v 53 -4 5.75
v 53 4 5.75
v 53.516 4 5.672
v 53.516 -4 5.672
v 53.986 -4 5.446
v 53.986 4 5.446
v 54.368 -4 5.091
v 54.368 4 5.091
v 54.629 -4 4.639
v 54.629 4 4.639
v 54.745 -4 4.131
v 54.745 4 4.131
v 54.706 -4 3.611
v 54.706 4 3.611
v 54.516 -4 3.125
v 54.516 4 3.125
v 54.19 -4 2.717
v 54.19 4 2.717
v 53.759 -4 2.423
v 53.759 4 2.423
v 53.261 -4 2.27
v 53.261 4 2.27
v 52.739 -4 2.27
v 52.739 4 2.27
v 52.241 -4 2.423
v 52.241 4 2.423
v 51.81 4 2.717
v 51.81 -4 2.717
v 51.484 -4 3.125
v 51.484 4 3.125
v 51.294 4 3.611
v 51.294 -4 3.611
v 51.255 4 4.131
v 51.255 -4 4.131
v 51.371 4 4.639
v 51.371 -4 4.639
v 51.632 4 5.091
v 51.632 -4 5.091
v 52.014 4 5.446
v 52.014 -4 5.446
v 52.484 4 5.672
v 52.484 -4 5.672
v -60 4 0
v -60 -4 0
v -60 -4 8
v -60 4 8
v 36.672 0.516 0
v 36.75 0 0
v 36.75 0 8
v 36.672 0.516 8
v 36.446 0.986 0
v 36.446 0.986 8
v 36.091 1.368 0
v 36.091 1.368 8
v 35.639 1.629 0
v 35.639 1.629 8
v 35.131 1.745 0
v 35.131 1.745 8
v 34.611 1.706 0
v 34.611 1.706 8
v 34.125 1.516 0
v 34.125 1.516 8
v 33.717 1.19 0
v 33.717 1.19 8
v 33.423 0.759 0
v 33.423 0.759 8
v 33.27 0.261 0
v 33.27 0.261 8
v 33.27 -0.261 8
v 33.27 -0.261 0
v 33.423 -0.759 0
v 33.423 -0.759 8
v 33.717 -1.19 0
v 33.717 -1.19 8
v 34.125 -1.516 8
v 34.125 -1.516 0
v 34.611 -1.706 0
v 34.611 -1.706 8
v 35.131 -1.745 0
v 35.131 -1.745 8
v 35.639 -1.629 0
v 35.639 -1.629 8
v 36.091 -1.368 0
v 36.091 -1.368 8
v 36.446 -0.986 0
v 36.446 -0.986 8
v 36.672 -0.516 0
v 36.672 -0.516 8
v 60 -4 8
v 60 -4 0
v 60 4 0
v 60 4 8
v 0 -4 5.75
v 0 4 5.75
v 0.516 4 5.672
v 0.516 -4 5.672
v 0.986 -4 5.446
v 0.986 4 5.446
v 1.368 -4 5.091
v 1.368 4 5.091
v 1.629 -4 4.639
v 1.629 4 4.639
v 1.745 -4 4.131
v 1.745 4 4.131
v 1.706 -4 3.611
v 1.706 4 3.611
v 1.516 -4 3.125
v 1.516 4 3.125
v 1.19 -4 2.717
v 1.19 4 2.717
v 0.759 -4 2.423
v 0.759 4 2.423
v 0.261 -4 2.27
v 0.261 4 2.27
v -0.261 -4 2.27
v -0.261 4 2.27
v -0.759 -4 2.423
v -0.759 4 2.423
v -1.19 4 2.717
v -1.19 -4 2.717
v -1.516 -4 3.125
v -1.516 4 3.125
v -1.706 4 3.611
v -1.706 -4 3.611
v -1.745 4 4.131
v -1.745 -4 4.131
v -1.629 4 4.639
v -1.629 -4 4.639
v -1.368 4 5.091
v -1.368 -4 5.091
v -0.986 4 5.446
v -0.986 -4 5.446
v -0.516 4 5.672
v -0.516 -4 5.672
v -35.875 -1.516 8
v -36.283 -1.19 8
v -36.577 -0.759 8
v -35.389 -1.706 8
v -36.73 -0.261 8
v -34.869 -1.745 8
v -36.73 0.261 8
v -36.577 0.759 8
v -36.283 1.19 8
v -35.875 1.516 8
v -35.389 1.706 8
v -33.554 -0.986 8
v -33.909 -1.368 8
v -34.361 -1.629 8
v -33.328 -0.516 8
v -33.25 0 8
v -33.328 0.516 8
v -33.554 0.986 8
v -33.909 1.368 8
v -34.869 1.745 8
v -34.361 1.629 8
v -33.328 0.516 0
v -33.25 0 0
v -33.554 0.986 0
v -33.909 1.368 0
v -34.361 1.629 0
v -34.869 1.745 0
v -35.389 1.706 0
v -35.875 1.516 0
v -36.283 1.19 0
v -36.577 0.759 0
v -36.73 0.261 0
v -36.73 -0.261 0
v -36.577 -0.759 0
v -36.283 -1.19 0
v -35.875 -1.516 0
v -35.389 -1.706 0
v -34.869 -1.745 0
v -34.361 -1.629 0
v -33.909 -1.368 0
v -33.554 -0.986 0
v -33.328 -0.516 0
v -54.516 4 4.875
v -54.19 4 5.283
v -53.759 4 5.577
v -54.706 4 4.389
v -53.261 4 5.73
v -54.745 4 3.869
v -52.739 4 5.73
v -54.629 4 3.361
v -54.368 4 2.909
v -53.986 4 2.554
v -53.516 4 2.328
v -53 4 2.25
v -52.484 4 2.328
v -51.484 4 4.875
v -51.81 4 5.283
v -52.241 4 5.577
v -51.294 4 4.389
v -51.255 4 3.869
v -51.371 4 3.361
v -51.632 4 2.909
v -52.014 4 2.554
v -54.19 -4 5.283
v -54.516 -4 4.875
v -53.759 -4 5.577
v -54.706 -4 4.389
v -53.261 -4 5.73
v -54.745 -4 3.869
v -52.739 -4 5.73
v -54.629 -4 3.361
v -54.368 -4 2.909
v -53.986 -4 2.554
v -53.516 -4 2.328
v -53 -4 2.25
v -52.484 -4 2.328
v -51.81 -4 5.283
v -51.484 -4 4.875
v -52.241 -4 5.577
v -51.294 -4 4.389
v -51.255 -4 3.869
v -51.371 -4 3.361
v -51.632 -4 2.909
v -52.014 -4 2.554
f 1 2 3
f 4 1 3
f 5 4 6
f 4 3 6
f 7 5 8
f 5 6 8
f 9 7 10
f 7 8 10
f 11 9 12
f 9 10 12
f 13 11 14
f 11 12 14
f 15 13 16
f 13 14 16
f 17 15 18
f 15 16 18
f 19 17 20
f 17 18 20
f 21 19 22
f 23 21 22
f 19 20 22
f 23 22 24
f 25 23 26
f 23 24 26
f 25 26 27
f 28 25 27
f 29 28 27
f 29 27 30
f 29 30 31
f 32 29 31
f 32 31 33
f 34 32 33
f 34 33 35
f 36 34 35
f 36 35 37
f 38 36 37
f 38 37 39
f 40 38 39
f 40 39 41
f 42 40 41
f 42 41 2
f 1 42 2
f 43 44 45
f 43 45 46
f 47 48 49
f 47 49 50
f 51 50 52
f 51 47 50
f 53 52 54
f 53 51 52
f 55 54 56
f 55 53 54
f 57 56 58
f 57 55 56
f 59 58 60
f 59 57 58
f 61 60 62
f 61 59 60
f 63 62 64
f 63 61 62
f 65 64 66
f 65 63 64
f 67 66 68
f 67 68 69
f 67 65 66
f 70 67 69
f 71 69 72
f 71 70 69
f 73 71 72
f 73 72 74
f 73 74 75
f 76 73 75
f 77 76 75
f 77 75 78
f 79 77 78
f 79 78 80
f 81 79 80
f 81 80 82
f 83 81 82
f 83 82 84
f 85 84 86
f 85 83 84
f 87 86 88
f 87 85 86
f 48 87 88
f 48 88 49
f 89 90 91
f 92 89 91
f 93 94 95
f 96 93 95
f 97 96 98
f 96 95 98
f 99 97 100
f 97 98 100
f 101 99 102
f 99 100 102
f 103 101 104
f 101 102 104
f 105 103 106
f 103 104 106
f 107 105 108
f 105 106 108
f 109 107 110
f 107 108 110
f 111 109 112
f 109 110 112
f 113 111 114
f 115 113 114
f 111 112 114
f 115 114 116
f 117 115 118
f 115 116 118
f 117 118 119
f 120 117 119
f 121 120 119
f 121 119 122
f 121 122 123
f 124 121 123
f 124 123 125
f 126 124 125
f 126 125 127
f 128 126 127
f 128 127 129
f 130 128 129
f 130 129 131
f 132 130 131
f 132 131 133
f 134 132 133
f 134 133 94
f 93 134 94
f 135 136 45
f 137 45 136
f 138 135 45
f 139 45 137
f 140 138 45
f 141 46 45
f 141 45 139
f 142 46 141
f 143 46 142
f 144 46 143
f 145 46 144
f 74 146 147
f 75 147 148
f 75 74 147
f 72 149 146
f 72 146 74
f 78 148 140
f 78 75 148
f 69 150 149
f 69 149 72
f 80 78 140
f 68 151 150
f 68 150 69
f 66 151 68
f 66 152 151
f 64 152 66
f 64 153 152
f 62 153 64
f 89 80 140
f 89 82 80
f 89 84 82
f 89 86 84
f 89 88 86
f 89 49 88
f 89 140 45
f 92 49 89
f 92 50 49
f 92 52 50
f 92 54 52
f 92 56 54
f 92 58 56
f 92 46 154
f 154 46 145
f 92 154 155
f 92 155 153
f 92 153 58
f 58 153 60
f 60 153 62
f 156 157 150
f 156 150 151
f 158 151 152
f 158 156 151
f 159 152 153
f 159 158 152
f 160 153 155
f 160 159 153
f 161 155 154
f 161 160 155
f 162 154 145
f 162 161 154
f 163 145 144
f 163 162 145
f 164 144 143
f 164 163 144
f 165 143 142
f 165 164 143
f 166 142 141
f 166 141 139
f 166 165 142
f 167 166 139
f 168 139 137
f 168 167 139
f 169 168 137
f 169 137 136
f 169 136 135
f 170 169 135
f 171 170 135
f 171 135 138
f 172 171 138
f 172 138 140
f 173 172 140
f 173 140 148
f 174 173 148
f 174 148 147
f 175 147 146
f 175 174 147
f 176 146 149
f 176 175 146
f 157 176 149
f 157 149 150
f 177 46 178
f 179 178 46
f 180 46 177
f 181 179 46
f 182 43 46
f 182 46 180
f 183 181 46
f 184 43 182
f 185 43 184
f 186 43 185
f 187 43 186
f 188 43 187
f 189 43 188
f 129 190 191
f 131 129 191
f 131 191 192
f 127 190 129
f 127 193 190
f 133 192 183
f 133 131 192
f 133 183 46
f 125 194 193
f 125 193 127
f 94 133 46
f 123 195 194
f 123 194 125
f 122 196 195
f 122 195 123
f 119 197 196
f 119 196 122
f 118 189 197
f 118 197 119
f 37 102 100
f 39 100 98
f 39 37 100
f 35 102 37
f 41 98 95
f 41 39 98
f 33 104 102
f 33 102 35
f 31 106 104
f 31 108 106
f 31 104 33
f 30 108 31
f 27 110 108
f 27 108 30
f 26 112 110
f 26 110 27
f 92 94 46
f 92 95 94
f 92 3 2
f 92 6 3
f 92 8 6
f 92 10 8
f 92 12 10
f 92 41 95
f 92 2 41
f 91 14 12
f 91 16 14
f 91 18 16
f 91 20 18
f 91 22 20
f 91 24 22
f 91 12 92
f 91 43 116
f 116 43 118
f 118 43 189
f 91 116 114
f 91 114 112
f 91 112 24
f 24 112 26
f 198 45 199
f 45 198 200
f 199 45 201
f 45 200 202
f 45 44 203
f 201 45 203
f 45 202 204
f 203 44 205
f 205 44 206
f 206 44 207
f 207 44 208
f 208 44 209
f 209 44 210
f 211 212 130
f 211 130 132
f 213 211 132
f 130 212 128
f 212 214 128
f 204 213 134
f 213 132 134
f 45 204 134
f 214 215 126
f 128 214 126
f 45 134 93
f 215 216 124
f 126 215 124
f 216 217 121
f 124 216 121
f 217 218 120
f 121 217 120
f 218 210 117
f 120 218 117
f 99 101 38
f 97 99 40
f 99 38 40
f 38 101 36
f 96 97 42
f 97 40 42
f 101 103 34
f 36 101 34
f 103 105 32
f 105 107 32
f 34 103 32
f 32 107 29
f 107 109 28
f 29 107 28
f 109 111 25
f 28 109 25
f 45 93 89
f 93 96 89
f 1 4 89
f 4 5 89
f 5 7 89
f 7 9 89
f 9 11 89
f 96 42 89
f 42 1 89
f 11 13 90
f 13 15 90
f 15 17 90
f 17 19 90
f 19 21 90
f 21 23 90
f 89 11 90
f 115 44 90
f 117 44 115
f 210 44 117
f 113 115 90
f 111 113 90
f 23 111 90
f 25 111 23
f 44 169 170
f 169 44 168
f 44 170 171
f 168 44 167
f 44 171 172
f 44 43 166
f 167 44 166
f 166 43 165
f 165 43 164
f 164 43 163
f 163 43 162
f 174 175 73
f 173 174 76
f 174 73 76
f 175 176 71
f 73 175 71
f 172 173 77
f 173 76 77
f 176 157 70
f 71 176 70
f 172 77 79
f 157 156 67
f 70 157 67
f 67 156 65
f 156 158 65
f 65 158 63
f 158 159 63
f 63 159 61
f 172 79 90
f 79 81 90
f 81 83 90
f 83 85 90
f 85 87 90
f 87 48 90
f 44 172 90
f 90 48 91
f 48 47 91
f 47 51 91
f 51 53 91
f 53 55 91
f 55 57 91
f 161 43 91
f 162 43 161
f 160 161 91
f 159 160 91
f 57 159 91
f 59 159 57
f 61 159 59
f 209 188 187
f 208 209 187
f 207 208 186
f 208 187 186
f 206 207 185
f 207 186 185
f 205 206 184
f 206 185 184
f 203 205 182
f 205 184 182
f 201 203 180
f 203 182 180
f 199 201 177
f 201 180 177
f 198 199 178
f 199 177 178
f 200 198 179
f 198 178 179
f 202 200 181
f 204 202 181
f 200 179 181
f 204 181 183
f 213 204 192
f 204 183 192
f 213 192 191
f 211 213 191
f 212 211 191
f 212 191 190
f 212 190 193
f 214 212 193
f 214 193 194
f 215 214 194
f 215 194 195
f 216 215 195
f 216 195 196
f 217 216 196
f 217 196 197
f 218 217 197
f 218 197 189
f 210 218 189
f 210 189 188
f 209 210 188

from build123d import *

# Parameters (mm, degrees)
SKIZZE1_W                       = 120
SKIZZE1_H                       = 8
SKIZZE1_R                       = 1.75
AUFSATZ_LINEAR_AUSTRAGEN1_DEPTH = 8
SKIZZE2_R                       = 1.75
SCHNITT_LINEAR_AUSTRAGEN1_DEPTH = 62.05735009


with BuildPart() as part:
    # Skizze1 → Aufsatz-Linear austragen1 (new body)
    with BuildSketch(Plane.XY):
        Rectangle(SKIZZE1_W, SKIZZE1_H)
        with Locations((-35, 0)):
            Circle(SKIZZE1_R, mode=Mode.SUBTRACT)
        with Locations((35, 0)):
            Circle(SKIZZE1_R, mode=Mode.SUBTRACT)
    extrude(amount=AUFSATZ_LINEAR_AUSTRAGEN1_DEPTH)

    # Skizze2 → Schnitt-Linear austragen1 (cut, through all)
    with BuildSketch(Plane(origin=(0, 4, 0), x_dir=(1, 0, 0), z_dir=(0, 1, 0))):
        with Locations(Location((53, -4, 0), (0, 0, 270))):
            Circle(SKIZZE2_R)
        with Locations(Location((-53, -4, 0), (0, 0, 90))):
            Circle(SKIZZE2_R)
        with Locations(Location((0, -4, 0), (0, 0, 270))):
            Circle(SKIZZE2_R)
    extrude(amount=-SCHNITT_LINEAR_AUSTRAGEN1_DEPTH, mode=Mode.SUBTRACT)


solid = part.part
